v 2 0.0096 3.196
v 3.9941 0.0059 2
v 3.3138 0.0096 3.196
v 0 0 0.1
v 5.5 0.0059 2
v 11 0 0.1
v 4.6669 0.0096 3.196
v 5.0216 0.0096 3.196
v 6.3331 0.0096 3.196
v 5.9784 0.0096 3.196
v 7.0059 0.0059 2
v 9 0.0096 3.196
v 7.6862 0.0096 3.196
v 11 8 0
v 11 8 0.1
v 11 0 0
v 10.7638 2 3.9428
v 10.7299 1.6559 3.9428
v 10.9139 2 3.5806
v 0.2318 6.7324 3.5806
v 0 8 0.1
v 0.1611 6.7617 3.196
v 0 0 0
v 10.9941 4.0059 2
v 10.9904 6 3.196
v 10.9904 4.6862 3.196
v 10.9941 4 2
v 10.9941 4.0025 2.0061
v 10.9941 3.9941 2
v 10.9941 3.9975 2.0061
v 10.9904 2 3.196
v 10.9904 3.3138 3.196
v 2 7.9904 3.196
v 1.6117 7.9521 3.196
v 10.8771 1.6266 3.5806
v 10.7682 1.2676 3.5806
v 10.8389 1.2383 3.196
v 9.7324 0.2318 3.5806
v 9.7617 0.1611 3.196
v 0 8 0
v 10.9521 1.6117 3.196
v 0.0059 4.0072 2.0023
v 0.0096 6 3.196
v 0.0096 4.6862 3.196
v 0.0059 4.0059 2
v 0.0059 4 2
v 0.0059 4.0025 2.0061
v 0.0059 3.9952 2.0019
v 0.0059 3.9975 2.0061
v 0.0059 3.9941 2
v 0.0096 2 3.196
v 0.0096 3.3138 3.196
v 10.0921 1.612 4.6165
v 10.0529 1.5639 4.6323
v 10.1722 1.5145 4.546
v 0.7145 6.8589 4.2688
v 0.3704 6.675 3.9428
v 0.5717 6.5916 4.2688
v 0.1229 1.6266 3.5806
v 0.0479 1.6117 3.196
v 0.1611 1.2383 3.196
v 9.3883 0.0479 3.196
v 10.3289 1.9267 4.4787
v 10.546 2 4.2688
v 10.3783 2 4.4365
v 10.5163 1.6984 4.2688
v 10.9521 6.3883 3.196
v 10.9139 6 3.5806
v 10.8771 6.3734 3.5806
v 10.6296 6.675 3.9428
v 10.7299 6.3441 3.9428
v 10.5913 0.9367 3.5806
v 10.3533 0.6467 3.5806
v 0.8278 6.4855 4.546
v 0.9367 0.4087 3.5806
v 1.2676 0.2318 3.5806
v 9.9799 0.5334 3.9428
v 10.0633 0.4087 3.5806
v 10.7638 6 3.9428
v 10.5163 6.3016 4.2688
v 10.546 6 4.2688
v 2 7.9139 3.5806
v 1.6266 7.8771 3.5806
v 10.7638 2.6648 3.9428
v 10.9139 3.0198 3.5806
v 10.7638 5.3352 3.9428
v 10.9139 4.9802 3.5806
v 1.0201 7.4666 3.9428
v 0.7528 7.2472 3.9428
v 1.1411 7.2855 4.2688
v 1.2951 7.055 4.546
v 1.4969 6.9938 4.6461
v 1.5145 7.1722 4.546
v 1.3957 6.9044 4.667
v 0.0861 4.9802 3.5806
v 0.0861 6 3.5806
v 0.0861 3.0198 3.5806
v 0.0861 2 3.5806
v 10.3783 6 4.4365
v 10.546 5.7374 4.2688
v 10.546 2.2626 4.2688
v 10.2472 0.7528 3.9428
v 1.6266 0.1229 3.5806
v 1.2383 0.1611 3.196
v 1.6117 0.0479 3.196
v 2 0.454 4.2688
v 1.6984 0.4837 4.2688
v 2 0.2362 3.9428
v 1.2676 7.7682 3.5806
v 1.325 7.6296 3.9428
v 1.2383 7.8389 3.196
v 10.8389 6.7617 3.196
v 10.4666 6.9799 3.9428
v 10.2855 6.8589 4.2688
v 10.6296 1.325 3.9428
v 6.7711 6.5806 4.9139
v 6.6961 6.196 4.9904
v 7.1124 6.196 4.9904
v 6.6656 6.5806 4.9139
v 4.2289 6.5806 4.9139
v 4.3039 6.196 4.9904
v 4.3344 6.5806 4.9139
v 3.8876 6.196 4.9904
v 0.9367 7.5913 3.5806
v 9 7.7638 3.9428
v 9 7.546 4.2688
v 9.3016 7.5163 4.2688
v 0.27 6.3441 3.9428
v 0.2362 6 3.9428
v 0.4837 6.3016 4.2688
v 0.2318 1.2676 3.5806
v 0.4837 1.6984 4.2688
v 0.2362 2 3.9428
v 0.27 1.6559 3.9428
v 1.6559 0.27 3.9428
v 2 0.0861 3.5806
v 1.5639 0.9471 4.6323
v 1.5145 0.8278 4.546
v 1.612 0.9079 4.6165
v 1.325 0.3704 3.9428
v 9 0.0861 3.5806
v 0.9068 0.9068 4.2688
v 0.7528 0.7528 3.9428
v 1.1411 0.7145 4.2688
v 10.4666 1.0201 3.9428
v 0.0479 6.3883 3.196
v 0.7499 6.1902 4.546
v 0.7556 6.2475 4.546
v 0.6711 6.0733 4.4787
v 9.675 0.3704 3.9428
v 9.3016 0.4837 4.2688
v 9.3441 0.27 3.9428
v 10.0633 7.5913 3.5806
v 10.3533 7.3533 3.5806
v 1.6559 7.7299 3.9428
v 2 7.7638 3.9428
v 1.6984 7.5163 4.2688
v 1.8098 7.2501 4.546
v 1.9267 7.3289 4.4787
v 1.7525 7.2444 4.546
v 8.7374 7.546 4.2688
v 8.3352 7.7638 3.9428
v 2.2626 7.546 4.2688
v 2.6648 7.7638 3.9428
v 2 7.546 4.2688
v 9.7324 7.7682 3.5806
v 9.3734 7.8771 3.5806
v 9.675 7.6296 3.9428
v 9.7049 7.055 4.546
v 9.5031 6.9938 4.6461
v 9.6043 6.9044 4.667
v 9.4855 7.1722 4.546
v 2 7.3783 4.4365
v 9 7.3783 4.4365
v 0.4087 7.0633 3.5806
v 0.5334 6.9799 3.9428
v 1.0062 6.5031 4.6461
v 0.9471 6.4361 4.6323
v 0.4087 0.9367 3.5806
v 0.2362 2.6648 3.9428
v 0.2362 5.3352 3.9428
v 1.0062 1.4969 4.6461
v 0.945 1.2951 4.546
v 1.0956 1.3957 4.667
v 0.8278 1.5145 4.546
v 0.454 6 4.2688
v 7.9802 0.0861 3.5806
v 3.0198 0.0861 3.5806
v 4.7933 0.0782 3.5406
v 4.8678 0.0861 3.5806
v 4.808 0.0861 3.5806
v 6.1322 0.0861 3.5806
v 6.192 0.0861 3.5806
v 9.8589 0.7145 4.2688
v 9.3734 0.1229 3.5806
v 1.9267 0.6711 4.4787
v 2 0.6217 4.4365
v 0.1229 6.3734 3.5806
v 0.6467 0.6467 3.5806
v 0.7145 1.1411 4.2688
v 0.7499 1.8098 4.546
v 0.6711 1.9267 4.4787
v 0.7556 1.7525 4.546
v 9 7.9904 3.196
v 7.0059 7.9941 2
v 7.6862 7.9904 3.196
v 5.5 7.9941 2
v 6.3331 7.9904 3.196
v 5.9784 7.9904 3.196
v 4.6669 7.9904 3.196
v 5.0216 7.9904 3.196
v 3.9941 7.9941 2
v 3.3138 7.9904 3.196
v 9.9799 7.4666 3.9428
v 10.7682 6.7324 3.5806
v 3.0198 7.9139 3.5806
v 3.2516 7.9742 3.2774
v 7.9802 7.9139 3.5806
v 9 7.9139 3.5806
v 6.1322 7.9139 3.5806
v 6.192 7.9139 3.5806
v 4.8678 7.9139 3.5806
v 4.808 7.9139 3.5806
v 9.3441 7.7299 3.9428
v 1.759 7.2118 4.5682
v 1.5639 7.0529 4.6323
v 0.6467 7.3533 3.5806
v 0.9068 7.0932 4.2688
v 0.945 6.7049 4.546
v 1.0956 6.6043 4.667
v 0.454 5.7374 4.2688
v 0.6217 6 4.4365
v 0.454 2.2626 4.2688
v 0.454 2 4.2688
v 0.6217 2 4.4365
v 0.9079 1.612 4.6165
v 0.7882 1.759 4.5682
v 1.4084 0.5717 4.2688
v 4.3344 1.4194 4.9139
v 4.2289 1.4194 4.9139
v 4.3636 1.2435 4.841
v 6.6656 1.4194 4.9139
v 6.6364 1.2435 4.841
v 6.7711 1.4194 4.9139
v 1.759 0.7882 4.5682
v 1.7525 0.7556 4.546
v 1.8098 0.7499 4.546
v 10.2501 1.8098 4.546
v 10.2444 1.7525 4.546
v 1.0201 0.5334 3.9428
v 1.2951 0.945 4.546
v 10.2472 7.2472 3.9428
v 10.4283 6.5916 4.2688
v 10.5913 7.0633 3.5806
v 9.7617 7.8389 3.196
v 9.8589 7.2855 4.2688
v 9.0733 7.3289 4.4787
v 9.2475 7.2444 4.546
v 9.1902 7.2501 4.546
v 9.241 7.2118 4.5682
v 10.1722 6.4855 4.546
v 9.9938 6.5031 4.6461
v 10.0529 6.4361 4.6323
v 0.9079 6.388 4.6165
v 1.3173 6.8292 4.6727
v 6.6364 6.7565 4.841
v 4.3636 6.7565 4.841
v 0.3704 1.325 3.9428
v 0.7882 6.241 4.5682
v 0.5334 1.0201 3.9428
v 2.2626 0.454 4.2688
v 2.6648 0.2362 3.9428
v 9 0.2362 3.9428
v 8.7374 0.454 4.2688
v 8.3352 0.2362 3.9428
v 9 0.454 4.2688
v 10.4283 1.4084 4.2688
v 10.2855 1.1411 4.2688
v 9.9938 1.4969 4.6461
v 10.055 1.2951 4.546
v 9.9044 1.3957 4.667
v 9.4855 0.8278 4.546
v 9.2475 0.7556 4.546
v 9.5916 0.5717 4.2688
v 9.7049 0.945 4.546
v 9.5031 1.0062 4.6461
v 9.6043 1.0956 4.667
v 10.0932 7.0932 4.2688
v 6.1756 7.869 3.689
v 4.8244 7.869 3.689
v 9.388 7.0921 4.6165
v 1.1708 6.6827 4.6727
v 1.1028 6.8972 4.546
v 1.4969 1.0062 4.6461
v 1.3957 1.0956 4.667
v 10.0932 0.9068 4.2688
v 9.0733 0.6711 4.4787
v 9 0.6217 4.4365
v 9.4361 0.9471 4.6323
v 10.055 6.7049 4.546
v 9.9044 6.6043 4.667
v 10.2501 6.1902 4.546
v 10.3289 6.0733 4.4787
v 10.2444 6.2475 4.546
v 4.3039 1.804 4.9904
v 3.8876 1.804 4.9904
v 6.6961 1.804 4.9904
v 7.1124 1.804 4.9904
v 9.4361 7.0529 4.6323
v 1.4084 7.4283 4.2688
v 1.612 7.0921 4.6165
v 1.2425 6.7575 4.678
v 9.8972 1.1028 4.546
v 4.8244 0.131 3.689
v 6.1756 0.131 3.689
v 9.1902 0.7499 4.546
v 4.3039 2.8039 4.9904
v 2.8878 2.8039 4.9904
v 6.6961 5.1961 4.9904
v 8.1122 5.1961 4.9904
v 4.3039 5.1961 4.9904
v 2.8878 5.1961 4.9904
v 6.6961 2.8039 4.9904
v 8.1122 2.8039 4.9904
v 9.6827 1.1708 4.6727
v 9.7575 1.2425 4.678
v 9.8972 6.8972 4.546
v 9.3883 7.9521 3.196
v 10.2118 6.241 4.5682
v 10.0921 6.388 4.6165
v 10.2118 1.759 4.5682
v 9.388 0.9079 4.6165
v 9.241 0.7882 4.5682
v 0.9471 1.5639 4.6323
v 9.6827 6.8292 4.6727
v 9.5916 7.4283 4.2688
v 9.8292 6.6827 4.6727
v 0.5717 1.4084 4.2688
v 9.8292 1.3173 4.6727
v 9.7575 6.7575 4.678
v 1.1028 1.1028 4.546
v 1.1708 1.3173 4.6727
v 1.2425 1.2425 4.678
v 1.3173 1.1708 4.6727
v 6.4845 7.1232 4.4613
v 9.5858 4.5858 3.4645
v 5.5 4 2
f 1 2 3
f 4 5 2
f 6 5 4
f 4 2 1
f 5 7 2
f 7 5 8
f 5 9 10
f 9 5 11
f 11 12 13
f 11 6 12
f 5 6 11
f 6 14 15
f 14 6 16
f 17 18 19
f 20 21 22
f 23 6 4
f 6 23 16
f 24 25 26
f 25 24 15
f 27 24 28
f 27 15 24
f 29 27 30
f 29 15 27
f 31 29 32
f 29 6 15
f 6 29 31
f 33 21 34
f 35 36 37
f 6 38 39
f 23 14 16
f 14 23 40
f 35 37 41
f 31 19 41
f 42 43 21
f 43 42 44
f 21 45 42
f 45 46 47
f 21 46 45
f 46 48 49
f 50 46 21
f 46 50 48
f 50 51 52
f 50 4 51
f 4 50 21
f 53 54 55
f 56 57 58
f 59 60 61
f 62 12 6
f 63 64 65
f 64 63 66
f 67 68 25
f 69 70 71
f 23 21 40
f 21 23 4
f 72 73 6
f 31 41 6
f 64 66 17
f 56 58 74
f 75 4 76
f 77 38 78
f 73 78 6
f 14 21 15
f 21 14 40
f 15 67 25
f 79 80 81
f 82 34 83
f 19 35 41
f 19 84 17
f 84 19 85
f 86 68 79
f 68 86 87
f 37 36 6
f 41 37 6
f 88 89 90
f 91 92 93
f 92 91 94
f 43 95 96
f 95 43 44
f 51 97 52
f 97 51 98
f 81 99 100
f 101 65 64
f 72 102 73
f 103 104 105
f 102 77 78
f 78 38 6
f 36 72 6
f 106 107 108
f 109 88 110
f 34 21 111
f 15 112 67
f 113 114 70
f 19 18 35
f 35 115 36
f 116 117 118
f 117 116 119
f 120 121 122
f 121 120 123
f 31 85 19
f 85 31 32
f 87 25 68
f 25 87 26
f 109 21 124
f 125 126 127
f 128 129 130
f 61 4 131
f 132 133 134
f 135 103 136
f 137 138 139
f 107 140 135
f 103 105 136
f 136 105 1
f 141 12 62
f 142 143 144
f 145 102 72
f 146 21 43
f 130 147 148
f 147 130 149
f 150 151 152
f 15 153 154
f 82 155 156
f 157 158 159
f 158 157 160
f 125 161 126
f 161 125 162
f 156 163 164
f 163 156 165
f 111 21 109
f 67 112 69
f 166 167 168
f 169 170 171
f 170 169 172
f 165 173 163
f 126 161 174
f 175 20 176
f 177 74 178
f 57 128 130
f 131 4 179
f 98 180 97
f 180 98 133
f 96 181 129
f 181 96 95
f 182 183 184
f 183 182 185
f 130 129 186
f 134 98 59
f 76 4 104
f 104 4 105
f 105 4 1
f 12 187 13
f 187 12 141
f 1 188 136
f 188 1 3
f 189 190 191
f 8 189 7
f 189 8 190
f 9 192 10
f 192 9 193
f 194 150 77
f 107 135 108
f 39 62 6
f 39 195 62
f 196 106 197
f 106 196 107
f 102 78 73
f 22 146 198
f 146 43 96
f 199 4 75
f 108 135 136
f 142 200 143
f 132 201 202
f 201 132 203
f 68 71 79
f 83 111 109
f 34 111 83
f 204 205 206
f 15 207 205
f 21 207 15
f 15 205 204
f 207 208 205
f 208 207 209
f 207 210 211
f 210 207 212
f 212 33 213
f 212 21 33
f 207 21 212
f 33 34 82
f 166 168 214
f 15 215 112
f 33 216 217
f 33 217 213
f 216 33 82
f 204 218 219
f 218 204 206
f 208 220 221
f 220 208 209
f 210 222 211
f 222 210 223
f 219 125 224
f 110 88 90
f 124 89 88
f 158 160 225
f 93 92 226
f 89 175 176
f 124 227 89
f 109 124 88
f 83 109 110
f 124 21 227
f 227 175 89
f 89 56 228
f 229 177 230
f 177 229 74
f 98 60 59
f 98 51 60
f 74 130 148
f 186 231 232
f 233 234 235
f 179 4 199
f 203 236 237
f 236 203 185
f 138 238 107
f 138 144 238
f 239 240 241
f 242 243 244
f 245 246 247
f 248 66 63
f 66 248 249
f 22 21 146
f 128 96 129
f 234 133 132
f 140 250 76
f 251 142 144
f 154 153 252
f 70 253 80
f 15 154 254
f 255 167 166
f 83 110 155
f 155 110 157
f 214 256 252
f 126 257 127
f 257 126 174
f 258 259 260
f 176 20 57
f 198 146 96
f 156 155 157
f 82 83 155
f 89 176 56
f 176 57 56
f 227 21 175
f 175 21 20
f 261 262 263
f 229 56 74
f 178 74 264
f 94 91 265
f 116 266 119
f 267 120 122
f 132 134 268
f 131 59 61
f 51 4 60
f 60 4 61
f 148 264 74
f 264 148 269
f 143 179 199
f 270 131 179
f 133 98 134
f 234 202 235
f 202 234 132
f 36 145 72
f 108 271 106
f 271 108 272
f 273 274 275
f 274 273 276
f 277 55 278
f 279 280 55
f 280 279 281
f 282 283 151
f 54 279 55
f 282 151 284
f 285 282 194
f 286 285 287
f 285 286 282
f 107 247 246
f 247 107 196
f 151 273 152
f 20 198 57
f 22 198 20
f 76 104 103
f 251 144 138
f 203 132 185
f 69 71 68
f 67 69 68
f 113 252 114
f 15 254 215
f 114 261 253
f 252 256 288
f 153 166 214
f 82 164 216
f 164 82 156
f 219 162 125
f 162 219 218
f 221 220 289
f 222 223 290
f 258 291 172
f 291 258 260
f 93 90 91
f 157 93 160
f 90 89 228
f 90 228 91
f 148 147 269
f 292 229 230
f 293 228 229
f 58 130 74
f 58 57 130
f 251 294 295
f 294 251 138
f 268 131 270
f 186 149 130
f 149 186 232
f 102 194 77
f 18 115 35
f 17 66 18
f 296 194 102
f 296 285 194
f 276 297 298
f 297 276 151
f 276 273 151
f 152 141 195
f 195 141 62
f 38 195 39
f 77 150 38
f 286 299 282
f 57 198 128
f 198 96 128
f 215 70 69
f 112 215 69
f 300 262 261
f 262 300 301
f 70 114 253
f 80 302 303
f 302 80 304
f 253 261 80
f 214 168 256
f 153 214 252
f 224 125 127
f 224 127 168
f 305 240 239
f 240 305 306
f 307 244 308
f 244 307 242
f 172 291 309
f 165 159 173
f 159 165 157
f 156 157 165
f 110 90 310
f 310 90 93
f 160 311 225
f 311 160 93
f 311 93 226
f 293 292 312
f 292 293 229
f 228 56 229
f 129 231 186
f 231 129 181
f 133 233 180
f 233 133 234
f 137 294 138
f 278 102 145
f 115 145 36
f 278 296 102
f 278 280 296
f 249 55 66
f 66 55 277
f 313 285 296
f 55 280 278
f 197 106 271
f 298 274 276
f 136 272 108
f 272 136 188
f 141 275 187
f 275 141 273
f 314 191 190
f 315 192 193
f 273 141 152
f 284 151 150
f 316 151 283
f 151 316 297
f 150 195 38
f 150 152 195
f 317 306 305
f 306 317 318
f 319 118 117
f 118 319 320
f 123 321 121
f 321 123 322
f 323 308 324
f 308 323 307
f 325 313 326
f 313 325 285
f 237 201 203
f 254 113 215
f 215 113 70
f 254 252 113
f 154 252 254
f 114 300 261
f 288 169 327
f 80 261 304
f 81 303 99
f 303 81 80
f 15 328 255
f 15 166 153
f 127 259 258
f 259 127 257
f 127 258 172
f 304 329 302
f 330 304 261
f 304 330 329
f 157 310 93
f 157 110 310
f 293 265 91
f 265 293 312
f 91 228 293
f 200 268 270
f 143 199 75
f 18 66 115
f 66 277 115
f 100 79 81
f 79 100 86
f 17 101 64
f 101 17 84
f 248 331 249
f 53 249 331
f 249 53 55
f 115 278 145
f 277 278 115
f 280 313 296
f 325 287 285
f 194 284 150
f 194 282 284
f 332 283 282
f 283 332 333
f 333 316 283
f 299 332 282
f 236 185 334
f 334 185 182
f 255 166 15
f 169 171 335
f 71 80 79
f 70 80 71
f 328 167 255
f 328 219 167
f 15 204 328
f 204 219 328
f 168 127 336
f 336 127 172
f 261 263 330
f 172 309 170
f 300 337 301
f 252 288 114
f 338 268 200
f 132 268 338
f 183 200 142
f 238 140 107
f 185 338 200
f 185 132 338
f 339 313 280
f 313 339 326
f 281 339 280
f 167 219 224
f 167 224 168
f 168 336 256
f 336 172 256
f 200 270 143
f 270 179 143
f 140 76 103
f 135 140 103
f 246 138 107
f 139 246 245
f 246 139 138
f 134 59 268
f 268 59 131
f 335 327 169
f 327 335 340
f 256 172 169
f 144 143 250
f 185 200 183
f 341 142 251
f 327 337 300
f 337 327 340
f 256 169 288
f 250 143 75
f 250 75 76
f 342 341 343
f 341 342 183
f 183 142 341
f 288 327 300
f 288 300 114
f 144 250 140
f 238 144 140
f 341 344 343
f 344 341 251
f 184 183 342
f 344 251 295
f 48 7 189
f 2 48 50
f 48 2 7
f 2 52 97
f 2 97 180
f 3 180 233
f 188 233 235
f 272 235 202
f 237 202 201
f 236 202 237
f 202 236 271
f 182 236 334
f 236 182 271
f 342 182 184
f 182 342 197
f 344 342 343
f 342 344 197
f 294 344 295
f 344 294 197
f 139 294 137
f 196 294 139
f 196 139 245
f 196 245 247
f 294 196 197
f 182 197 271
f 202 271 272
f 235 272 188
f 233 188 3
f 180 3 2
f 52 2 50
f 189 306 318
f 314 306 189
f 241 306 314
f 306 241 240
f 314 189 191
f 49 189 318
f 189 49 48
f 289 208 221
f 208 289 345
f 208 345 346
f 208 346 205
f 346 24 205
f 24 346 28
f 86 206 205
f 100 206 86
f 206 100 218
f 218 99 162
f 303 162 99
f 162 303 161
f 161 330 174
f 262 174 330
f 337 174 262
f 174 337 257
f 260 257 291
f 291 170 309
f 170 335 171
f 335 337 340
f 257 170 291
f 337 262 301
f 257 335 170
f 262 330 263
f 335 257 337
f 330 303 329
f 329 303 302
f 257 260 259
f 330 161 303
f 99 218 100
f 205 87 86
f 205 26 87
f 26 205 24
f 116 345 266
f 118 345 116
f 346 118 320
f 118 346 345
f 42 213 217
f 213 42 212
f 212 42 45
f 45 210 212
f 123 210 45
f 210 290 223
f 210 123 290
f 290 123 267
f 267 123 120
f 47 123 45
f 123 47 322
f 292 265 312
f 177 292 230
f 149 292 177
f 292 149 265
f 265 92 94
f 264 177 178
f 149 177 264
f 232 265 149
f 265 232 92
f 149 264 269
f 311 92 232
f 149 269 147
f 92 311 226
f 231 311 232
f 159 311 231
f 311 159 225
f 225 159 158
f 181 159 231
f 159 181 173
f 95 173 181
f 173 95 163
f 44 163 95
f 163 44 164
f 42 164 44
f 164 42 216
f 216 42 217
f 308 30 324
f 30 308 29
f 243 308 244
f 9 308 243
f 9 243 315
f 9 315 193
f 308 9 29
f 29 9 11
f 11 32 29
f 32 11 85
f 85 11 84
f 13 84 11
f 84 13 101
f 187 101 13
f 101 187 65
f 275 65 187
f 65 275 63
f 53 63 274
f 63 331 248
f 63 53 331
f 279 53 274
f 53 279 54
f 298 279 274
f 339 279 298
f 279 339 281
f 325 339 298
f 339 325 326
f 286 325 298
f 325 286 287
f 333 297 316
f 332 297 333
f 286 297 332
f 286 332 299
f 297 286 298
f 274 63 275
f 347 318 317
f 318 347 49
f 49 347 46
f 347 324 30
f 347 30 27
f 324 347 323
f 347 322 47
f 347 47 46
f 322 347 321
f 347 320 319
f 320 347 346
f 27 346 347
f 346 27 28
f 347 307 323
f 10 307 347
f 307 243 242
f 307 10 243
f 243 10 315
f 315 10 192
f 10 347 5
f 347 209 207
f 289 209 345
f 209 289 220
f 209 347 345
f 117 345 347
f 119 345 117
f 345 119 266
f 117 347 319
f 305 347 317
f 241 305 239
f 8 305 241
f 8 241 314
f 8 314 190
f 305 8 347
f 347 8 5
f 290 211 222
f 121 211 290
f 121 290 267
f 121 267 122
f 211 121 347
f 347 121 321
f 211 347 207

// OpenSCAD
// Ground stakes to support strawberries and keep slugs away.

echo(version=version());

$fa = 8; $fs = 0.4;
eps = .001;
nozzle = 0.8; // 0.4mm
step = 0.18; // 0.12mm

module body () {
    hull () {
        cube([11, 8, 0.1]);
        translate([2, 2, 3]) sphere(d=4);
        translate([2, 6, 3]) sphere(d=4);
        translate([9, 2, 3]) sphere(d=4);
        translate([9, 6, 3]) sphere(d=4);
    };
}

points  = [
    [0, 0, 0],
    [20, 0, 0],
    [20, -2, 5],
    [0, -2, 5],
    [20, 2, 5],
    [0, 2, 5]
];

surfaces = [
    [0, 1, 2, 3],
    [0, 1, 4, 5]
];

module cut () {
    hull () polyhedron(points, surfaces);
}

difference () {
    body();
    color("blue") translate([0, 4, 2]) rotate([0, 0,-45]) cut();
    color("blue") translate([0, 15, 2]) rotate([0, 0,-45]) cut();
    color("blue") translate([0,  4, 2]) rotate([0, 0, 45]) cut();
    color("blue") translate([0, -7, 2]) rotate([0, 0, 45]) cut();
    color("red") translate([0, 4, 2]) cut();
    color("red") translate([11/2, 0, 2]) rotate([0, 0, 90]) cut();
}


//difference () {
//    body();
//    translate([-5, 5+3*1.414, 2]) {
//        rotate([0, 0,-45]) {
//            hull () polyhedron(points, surfaces)
//        }
//    };
//};
//translate([5, 5, 0]) sphere(d=5*2);
//module long_bar () {
//    translate([-2, -80, 0]) cube([4, 80, 1.8]); // horizontal brace
//    translate([-0.8, -80, 0]) cube([1.6, 80, 3.96]); // Vertical brace
//    translate([-2, -10, 0]) cube([4, 10, 3.96]); // rectangele support at top.
//}
//
//module stake () {
//    difference () {
//        long_bar();
//        translate([-5, -80, 0]) rotate([30, 0, 0])  cube([10, 10, 10]); // Angle cut.
//    }
//}
//
//// Top structure
//module top_structure () {
//    difference () {
//        translate([0, 20, 0]) cylinder(3.96, r=20);
//        translate([0, 20, 0-eps]) cylinder(3.96+eps*2, r=16);
//        translate([-22.4-20, 15, 0-eps]) cube([(22.4+20)*2, 25, 3.96+eps*2]);
//    }
//}
//
//module part () {
//    stake();
//    top_structure();
//}
//
//module two_parts () {
//    part();
//    translate([10, -90, 0]) rotate([0, 0, 180]) part();
//}
//
//module four_parts () {
//    two_parts();
//    translate([25, 20, 0]) two_parts();
//}
//
//part();
////four_parts();
